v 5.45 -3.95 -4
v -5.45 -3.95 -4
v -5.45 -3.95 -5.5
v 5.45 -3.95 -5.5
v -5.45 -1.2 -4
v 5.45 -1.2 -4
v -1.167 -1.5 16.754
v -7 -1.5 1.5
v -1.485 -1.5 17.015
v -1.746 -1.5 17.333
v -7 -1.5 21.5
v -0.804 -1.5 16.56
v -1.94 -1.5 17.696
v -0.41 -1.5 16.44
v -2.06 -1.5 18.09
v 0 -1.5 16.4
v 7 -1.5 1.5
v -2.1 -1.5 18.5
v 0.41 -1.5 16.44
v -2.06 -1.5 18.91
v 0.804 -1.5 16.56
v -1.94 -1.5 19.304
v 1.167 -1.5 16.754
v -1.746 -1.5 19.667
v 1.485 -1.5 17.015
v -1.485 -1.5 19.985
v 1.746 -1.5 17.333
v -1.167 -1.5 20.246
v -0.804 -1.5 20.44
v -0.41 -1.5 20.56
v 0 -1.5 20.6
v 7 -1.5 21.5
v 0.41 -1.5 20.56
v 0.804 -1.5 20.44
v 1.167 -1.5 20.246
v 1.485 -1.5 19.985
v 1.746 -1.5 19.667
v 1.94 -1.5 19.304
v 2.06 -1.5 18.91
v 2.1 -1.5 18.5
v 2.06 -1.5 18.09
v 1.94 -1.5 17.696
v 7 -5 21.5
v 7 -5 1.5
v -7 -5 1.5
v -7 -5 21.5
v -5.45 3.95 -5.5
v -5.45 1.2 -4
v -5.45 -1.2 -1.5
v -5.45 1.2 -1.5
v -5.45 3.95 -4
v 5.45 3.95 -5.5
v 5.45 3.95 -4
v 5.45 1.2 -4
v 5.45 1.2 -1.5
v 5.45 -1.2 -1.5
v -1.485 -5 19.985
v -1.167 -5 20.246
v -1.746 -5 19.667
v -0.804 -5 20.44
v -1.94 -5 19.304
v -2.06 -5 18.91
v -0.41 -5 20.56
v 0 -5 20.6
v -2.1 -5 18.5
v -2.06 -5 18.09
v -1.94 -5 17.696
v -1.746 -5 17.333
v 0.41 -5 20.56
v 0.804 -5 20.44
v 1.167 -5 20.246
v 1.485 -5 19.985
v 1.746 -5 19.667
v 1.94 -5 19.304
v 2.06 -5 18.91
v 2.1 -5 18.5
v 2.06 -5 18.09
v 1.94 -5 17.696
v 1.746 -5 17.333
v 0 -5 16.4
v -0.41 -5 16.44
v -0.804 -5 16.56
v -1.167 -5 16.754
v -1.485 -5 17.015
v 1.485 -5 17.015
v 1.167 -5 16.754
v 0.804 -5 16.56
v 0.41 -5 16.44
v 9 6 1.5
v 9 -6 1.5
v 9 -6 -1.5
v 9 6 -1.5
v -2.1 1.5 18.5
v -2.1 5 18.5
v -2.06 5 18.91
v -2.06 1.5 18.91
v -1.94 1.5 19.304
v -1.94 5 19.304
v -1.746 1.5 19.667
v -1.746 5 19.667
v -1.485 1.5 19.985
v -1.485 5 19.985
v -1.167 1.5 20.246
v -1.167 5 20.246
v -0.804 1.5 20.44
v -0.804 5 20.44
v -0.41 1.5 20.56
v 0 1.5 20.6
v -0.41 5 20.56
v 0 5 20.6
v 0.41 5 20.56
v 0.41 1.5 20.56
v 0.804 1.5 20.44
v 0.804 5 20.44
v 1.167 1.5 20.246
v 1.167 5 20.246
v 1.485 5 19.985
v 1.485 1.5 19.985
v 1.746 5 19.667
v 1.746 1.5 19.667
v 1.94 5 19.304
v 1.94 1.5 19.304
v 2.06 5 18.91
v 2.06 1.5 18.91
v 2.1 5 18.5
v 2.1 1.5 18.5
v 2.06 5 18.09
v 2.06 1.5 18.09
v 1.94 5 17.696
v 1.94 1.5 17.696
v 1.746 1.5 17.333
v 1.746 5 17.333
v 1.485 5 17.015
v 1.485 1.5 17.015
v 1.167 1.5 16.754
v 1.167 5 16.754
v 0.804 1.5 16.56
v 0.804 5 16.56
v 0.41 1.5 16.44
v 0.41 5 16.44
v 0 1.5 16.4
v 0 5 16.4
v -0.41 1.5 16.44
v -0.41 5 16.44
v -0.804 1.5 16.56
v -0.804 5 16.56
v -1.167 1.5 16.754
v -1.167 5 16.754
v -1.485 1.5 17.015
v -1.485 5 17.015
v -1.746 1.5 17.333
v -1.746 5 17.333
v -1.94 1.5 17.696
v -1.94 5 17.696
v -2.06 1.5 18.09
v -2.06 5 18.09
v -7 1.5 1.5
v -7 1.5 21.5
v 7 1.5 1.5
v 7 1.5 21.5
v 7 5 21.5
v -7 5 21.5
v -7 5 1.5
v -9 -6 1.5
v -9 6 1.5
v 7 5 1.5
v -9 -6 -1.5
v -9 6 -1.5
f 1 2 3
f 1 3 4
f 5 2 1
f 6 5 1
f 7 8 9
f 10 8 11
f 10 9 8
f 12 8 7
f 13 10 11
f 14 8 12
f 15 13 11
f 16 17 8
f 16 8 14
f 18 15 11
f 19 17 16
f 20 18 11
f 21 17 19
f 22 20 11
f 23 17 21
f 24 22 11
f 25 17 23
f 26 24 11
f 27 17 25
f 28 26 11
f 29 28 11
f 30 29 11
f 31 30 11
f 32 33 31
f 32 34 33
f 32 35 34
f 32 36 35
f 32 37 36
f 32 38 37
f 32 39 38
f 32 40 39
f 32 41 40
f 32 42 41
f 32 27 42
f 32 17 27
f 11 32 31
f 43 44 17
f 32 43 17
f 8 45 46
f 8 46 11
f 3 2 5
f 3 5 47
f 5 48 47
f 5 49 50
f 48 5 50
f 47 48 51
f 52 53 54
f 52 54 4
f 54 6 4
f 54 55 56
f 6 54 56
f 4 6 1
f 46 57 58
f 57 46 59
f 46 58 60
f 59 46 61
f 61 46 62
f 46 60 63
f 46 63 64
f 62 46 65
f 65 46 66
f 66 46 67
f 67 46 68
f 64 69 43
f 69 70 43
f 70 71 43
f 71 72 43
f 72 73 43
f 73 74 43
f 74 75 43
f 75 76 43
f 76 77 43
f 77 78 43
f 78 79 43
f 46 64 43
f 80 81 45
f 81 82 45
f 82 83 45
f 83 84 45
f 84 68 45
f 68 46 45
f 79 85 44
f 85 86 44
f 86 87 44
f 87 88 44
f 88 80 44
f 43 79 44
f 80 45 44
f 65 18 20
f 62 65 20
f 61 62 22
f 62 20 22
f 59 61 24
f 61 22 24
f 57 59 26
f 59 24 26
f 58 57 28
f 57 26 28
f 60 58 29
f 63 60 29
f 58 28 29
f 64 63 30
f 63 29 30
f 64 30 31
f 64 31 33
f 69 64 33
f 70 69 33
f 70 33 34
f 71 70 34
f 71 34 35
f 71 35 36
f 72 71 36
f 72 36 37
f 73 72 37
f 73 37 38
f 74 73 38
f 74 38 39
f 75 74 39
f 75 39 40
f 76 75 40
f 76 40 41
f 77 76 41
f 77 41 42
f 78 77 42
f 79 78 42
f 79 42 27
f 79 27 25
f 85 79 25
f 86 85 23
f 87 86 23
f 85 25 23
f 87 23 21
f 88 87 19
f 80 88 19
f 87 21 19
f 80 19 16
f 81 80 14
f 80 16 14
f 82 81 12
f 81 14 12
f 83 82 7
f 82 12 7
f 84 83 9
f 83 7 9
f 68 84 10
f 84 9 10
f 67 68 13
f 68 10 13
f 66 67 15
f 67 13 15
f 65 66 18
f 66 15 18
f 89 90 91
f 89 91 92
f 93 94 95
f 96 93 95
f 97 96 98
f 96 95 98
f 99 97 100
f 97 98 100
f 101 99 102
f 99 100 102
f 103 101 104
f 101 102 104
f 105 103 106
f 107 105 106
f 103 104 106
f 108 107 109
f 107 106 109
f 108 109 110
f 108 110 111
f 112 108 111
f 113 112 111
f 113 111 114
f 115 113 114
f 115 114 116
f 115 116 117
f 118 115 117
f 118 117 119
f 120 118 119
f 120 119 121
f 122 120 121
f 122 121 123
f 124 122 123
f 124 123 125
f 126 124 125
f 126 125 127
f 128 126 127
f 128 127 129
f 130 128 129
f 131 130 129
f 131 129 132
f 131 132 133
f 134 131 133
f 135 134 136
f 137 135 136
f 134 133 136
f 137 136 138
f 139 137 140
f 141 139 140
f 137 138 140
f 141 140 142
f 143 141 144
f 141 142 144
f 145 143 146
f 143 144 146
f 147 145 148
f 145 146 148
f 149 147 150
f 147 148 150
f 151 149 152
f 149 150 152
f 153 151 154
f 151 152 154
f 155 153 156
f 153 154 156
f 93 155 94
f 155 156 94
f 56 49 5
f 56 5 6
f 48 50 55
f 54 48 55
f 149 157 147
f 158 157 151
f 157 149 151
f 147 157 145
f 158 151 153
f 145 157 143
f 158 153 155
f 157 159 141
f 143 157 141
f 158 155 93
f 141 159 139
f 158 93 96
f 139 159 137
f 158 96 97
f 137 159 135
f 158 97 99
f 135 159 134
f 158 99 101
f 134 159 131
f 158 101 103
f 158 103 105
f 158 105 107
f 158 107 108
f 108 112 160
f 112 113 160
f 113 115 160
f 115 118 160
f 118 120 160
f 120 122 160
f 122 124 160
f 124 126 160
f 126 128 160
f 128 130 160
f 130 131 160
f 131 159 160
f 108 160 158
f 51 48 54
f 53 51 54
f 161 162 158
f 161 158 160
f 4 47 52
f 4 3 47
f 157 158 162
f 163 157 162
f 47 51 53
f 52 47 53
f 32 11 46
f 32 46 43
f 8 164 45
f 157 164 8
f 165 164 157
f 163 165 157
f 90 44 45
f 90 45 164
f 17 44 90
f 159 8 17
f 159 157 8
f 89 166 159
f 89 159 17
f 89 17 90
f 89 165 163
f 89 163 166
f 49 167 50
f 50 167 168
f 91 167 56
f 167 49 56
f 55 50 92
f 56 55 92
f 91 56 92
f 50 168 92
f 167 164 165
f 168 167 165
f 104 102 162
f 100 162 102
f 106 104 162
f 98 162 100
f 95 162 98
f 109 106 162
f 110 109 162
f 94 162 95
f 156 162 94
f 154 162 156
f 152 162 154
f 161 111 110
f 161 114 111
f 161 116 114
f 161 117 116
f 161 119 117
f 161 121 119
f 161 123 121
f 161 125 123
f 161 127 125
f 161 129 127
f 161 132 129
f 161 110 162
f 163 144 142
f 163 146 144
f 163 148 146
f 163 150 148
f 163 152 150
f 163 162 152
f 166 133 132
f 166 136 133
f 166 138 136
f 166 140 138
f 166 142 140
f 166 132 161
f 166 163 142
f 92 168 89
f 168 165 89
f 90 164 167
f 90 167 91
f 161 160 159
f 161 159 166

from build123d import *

# Parameters (mm, degrees)
F0_W      = 18
F0_H      = 12
F1_DEPTH  = 1.5
F2_W      = 14
F2_H      = 10
F3_DEPTH  = 20
F4_W      = 3
F4_H      = 20
F5_DEPTH  = 25
F7_D      = 4.2
F8_W      = 10.9
F8_H      = 2.4
F9_DEPTH  = 2.5
F10_W     = 10.9
F10_H     = 2.75
F10_H_2   = 2.4
F11_DEPTH = 1.5


with BuildPart() as f1:
    # F0 (on Top) → F1 (new body, symmetric)
    with BuildSketch(Plane.XY):
        Rectangle(F0_W, F0_H)
    extrude(amount=F1_DEPTH, both=True)

    # F2 (on face) → F3 (join)
    with BuildSketch(Plane.XY.offset(1.5)):
        Rectangle(F2_W, F2_H)
    extrude(amount=F3_DEPTH)

    # F4 (on face) → F5 (cut)
    with BuildSketch(Plane.YZ.offset(7)):
        with Locations((0, 11.5)):
            Rectangle(F4_W, F4_H)
    extrude(amount=-F5_DEPTH, mode=Mode.SUBTRACT)

    # F7 (through all)
    with Locations(Plane.XZ.offset(5)):
        with Locations((0, 18.5)):
            Hole(F7_D / 2)

    # F8 (on face) → F9 (join)
    with BuildSketch(Plane(origin=(0, 0, -1.5), x_dir=(1, 0, 0), z_dir=(0, 0, -1))):
        Rectangle(F8_W, F8_H)
    extrude(amount=F9_DEPTH)

    # F10 (on face) → F11 (join)
    with BuildSketch(Plane(origin=(0, 0, -4), x_dir=(1, 0, 0), z_dir=(0, 0, -1))):
        with Locations((0, -2.575)):
            Rectangle(F10_W, F10_H)
        Rectangle(F10_W, F10_H_2)
        with Locations((0, 2.575)):
            Rectangle(F10_W, F10_H)
    extrude(amount=F11_DEPTH)


solid = f1.part
